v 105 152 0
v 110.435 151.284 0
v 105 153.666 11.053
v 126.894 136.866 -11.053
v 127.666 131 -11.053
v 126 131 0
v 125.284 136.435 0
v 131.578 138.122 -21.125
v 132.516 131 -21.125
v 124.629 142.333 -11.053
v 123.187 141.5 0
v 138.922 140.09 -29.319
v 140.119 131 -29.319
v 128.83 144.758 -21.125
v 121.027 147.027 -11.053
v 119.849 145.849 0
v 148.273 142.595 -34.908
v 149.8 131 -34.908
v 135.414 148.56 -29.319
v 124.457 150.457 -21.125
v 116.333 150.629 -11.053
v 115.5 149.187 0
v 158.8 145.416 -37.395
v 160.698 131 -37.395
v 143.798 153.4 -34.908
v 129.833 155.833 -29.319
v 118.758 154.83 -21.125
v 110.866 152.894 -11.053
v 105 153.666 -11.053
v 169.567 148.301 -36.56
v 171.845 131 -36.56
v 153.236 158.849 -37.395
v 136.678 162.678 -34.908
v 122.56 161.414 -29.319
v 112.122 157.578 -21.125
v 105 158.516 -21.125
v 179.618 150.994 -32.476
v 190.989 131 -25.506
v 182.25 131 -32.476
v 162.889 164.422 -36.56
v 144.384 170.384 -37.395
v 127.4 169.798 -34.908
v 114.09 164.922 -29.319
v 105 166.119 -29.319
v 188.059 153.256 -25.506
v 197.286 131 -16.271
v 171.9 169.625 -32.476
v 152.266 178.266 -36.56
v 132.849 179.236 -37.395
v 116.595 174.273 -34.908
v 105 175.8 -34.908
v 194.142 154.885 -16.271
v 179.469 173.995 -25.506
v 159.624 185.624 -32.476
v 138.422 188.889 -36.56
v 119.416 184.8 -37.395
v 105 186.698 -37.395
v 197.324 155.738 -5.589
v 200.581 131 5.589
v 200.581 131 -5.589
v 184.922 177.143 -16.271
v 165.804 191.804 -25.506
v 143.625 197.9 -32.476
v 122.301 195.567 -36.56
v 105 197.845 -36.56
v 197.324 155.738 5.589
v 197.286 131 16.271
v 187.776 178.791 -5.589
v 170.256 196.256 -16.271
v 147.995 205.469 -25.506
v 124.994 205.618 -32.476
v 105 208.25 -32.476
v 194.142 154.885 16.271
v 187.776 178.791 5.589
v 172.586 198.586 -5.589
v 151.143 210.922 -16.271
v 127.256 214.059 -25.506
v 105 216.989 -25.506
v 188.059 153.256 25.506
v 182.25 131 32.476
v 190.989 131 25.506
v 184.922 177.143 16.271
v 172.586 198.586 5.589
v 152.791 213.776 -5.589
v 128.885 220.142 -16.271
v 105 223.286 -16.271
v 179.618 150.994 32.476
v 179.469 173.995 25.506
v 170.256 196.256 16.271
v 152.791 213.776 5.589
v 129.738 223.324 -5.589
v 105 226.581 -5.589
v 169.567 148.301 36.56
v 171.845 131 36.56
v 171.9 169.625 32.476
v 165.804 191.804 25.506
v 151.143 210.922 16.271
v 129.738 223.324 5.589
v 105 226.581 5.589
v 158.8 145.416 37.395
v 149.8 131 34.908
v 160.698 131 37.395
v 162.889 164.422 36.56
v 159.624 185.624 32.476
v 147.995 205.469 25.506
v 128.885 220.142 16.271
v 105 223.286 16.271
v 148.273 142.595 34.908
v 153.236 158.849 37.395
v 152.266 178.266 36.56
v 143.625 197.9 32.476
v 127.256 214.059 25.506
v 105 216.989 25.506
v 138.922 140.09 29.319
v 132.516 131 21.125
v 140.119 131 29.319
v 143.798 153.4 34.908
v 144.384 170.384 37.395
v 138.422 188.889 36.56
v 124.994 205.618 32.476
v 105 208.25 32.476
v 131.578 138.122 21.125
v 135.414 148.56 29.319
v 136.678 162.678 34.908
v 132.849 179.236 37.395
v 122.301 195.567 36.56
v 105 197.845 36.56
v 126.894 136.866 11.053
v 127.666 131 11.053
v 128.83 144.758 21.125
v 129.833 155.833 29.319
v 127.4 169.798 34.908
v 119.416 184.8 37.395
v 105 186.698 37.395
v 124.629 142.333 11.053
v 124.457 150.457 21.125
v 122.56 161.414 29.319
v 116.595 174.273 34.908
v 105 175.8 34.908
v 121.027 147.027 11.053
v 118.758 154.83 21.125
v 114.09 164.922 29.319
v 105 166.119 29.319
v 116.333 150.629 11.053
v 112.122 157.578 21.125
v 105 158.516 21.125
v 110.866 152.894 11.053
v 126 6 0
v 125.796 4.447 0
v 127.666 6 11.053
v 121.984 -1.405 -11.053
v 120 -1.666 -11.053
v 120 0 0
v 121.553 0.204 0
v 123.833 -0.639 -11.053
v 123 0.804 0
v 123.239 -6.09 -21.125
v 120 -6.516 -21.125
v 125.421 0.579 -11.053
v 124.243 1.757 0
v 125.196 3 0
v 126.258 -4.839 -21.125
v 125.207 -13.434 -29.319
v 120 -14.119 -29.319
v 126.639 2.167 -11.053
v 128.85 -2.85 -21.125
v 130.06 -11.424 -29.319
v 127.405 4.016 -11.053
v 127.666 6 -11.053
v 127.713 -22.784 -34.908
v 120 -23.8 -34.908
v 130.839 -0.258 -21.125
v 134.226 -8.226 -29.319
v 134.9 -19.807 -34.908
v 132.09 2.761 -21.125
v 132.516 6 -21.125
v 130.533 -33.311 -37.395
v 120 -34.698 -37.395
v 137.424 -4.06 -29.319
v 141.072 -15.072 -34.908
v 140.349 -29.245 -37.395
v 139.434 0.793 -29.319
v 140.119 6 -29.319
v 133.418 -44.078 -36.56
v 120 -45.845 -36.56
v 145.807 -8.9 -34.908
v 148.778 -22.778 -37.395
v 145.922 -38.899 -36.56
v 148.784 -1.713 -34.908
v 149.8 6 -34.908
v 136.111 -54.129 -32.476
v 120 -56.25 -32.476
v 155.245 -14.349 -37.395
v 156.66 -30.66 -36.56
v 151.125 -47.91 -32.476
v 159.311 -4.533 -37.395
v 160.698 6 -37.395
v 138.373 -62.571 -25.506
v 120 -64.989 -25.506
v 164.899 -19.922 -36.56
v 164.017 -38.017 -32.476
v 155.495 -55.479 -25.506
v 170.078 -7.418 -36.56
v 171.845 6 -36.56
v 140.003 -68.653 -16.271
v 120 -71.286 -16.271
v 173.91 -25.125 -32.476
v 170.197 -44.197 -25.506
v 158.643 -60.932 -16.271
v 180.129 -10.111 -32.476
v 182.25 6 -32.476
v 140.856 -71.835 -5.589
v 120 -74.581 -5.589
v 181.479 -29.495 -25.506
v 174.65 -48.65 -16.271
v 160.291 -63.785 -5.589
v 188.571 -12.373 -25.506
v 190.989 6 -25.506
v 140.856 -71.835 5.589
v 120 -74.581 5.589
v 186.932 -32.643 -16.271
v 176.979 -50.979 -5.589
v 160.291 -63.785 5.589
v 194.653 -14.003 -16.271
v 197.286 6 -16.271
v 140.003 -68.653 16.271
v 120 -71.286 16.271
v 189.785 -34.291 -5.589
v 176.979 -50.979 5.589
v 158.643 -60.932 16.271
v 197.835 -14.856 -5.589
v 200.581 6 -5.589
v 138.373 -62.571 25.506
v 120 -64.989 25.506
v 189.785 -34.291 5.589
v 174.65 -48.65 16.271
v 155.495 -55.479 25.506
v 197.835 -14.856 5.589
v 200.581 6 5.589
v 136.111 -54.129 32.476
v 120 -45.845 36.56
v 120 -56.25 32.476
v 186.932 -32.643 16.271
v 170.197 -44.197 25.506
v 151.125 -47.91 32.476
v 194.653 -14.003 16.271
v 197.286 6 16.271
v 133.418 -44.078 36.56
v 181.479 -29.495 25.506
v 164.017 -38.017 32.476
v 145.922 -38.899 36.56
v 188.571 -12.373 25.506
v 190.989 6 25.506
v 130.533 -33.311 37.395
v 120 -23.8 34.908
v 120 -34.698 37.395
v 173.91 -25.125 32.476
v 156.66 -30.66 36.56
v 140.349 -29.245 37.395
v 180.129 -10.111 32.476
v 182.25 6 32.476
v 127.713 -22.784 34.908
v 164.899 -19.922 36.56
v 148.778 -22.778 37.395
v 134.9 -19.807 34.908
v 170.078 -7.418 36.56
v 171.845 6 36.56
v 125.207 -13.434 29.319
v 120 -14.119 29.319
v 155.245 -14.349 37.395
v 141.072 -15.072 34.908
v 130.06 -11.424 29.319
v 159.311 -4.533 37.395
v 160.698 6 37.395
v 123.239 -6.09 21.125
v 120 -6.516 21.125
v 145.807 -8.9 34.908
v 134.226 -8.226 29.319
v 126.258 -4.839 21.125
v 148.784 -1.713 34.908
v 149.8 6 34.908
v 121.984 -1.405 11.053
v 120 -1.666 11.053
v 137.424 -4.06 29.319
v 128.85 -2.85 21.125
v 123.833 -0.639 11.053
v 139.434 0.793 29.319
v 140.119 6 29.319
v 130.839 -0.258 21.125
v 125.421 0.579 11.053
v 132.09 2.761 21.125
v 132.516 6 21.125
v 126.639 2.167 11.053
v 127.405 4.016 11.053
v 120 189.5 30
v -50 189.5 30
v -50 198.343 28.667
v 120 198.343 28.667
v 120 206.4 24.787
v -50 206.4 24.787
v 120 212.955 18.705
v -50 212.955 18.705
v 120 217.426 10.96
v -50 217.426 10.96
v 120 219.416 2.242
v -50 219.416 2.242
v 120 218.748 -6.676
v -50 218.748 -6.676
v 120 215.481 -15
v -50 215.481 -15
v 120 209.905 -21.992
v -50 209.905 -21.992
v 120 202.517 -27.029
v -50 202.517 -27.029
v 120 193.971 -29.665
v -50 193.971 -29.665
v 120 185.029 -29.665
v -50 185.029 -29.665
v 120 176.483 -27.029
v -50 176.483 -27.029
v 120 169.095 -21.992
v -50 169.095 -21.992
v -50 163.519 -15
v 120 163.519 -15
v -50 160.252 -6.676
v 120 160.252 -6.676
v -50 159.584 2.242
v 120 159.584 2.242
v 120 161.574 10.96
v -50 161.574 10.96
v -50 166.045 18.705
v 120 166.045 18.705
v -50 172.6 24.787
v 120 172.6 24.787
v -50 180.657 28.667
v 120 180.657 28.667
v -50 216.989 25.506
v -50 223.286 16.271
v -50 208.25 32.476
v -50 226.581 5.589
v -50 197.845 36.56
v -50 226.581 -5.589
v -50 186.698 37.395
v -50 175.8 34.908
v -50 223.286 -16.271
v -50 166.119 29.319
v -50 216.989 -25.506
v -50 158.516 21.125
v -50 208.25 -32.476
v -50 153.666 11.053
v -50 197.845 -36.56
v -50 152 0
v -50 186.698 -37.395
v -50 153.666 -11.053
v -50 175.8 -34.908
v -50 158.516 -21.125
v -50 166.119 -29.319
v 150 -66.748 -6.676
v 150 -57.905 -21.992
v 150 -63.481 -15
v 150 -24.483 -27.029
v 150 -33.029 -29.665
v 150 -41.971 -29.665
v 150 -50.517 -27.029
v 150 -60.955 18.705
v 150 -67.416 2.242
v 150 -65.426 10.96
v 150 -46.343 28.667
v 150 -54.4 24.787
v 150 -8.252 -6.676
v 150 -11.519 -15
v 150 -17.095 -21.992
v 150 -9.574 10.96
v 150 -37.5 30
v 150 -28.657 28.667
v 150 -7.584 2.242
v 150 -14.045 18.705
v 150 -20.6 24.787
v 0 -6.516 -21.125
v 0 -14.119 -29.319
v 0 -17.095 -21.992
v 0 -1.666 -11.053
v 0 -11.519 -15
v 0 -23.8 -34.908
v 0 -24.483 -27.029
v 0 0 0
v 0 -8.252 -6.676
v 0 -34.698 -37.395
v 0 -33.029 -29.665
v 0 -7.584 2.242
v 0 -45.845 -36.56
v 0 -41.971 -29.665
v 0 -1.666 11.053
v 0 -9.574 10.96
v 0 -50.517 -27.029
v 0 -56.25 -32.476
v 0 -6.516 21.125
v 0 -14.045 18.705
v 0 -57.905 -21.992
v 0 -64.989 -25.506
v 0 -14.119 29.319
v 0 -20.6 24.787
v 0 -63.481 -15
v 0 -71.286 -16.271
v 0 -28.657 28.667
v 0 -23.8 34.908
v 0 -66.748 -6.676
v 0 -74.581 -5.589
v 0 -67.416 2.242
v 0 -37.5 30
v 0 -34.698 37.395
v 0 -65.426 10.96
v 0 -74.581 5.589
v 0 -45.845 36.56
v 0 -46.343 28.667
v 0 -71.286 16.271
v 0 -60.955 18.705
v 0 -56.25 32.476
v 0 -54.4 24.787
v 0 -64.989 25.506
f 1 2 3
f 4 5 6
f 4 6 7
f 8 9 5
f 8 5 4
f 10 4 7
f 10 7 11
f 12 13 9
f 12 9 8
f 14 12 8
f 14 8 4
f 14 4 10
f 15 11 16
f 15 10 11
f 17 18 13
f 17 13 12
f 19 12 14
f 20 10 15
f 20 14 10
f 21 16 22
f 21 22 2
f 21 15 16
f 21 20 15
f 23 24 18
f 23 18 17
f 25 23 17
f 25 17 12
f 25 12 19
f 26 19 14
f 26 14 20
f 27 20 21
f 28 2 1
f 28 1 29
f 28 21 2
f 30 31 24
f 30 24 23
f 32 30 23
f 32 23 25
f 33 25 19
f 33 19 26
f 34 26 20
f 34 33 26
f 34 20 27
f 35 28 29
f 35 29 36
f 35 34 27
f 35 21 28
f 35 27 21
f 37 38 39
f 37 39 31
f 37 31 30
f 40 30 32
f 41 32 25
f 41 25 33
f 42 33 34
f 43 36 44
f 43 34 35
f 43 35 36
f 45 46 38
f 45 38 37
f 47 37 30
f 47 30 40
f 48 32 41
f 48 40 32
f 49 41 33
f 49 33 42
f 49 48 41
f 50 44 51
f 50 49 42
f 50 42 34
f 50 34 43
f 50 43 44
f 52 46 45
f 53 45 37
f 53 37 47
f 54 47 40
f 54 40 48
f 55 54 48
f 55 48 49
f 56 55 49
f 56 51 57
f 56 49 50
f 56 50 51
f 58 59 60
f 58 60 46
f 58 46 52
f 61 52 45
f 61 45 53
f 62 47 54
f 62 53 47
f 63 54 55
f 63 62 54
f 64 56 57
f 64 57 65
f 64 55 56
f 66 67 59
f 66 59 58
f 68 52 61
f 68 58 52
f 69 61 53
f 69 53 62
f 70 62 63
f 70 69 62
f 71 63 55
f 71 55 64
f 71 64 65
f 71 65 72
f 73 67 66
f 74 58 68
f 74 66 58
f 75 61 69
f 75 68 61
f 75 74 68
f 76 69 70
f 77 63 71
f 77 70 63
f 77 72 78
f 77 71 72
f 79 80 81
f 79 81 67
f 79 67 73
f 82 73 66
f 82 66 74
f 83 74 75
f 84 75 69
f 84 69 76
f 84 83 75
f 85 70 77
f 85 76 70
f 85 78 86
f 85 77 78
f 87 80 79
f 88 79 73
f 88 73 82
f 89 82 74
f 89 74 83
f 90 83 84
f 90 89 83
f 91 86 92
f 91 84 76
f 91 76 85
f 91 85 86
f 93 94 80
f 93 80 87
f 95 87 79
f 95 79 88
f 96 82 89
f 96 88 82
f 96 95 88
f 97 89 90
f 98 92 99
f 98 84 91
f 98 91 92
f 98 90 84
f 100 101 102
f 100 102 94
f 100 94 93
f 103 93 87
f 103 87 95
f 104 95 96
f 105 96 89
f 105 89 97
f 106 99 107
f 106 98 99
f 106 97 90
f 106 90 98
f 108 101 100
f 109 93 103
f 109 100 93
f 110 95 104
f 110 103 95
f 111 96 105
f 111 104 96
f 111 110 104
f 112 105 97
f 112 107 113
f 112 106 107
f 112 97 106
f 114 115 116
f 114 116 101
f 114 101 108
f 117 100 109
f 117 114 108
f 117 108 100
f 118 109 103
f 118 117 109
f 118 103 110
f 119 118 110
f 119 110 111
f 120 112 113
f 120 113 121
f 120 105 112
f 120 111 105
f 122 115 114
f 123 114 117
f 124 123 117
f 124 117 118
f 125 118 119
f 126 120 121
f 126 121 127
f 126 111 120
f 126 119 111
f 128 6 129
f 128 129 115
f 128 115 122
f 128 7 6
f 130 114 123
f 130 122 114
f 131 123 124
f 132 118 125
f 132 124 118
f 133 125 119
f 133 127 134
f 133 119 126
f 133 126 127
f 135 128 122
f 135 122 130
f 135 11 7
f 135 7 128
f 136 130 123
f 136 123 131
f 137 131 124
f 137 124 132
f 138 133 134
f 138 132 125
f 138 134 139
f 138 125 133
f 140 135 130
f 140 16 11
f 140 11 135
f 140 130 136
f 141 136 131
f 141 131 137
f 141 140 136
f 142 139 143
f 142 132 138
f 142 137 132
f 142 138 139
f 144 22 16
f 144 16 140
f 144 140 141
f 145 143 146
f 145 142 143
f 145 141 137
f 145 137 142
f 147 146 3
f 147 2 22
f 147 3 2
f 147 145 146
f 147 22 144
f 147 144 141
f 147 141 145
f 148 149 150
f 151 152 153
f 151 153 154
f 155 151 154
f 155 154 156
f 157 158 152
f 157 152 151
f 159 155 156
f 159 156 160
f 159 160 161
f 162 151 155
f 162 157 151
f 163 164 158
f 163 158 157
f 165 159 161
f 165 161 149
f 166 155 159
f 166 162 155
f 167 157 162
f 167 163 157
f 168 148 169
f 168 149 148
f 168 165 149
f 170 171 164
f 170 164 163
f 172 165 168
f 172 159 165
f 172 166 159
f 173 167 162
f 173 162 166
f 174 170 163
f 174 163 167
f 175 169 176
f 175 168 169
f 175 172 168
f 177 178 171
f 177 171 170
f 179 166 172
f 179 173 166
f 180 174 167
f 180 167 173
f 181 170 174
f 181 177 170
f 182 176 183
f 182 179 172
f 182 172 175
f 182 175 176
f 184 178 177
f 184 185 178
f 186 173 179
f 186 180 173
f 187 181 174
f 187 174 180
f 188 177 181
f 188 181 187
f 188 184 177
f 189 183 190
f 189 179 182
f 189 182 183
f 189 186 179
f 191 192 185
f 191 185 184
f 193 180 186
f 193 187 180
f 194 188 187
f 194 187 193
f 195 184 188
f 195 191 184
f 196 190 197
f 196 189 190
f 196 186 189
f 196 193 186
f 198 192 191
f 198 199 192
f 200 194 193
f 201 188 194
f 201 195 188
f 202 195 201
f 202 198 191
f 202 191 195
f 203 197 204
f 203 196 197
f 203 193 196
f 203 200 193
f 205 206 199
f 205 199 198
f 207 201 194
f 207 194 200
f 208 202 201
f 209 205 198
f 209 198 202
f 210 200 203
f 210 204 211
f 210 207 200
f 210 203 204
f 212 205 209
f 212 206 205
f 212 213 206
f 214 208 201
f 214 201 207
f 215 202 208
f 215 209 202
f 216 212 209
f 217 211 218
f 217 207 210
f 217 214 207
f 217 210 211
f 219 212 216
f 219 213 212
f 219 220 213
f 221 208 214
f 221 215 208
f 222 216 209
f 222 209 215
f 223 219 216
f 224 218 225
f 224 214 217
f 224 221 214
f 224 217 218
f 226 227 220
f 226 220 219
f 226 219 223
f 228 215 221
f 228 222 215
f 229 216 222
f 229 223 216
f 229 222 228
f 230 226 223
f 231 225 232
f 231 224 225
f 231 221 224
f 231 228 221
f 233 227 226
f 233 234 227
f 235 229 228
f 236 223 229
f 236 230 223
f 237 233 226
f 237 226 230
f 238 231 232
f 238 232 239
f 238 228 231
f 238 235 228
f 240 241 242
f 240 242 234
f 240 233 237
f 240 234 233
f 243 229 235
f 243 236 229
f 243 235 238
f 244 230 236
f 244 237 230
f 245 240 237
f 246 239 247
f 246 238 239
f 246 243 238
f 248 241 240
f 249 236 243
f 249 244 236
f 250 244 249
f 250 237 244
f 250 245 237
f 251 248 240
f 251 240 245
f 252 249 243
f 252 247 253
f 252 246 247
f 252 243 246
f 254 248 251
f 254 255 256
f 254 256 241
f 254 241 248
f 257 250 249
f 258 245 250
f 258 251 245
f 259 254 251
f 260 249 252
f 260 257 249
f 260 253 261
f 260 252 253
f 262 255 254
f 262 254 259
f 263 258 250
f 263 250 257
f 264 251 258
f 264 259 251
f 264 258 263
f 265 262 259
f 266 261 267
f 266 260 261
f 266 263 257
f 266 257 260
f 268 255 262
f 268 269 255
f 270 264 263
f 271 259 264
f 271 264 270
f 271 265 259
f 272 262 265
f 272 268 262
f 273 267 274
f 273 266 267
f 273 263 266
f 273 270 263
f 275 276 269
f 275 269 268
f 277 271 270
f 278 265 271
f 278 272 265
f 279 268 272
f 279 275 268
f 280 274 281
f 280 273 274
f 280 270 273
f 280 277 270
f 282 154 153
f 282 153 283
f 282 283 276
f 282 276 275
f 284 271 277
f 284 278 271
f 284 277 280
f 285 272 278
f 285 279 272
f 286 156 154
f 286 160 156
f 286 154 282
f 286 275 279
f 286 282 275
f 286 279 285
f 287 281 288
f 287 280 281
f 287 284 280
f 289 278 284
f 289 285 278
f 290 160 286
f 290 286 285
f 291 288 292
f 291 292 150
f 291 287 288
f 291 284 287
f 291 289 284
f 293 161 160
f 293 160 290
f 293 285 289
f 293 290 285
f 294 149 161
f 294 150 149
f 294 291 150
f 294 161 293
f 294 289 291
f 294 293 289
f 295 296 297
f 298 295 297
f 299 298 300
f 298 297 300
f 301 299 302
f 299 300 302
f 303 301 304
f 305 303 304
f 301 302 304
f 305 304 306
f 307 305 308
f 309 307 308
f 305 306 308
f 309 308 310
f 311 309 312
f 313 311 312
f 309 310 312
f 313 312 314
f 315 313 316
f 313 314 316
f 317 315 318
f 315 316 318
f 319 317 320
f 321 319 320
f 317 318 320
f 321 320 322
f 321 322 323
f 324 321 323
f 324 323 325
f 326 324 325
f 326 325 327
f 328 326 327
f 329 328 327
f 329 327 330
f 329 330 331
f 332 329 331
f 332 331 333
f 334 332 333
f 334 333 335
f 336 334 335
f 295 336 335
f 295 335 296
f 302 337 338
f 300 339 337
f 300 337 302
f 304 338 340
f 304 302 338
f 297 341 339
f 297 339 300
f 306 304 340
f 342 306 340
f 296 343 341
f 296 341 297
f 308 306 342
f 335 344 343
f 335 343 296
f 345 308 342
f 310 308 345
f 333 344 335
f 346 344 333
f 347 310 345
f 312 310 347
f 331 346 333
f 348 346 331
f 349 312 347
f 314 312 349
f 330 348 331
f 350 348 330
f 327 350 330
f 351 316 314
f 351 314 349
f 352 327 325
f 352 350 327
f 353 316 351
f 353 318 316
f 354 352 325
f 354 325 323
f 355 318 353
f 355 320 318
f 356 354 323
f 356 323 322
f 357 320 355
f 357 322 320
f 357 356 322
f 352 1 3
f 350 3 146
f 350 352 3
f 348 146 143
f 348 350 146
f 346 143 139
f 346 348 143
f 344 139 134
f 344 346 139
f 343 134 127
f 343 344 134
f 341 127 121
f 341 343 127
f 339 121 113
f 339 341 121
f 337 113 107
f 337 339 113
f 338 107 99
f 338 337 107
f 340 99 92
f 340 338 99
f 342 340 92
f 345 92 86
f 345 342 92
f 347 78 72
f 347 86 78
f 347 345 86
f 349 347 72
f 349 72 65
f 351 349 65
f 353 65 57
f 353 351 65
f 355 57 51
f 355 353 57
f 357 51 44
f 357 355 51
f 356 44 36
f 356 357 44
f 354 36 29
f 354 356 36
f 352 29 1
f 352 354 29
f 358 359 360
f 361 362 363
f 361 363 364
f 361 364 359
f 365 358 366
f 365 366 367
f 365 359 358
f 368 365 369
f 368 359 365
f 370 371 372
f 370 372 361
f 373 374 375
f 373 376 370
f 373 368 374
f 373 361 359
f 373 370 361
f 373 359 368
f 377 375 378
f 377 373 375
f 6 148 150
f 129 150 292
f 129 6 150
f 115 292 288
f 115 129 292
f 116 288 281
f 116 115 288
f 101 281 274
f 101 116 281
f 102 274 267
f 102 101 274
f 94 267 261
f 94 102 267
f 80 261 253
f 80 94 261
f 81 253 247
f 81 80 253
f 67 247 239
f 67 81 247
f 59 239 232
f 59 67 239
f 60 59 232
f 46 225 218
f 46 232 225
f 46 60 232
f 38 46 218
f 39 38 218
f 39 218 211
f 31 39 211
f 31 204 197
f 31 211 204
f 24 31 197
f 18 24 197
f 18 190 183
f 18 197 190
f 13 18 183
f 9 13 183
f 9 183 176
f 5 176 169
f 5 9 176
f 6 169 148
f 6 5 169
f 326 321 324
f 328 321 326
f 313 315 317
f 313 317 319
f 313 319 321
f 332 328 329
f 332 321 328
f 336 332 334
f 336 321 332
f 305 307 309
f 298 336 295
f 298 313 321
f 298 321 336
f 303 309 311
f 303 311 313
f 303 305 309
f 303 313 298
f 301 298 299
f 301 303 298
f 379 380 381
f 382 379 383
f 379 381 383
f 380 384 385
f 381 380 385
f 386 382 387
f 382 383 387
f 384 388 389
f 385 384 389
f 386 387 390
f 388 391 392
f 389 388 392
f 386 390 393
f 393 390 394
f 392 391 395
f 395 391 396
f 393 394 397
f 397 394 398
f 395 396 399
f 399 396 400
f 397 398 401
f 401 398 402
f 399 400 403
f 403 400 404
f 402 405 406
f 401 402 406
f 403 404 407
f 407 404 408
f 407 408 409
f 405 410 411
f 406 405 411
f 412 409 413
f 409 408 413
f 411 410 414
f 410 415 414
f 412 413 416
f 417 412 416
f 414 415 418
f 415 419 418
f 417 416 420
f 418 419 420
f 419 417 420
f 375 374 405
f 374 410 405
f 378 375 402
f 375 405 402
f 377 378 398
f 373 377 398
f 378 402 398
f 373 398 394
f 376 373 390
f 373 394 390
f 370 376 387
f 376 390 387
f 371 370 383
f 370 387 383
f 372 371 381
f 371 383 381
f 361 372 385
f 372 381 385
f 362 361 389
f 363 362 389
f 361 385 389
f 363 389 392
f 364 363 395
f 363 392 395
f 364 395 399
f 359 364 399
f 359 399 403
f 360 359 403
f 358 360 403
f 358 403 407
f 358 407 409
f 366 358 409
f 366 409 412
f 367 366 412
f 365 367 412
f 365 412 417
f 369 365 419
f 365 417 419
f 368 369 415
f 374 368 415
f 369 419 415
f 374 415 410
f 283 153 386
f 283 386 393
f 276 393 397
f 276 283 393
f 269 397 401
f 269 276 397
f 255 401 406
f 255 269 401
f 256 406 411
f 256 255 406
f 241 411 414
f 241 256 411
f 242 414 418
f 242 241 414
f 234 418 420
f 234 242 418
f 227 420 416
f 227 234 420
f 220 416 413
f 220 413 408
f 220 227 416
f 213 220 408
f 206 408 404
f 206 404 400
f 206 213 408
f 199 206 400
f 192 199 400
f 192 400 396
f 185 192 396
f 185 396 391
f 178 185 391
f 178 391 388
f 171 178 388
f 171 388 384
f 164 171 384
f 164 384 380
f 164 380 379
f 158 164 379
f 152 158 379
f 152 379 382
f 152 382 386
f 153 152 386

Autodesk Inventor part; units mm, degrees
ref_plane "YZ Plane" through (0, 0, 0) normal (1, 0, 0) x (0, 1, 0)
ref_plane "XZ Plane" through (0, 0, 0) normal (0, 1, 0) x (-1, 0, 0)
ref_plane "XY Plane" through (0, 0, 0) normal (0, 0, 1) x (1, 0, 0)
sketch "Sketch1" plane through (0, 0, 0) normal (1, 0, 0) x (0, 1, 0)
  circle A0 centre (-37.5, 0) radius 37.5
  point P0 (0, 0)
  dimension "d7" = 75
sketch3d "3D Sketch2"
  line L0 (0, -24, 0) -> (120, -24, 0)
  arc A0 (120, -24, 0) -> (150, 6, 0) centre (120, 6, 0) ccw
  line L1 (150, 6, 0) -> (150, 131, 0)
  arc A1 (150, 131, 0) -> (105, 176, 0) centre (105, 131, 0) ccw
  line L2 (105, 176, 0) -> (-50, 176, 0)
  dimension "d0" = 150
  dimension "d1" = 200
  dimension "d2" = 30
  dimension "d3" = 200
  dimension "d4" = 45
sweep "Sweep1" add profiles "Sketch1" path "3D Sketch2"
sketch "Sketch2" plane through (-50, 189.5, 0) normal (-1, 0, 0) x (0, 0, 1)
  circle A0 centre (0, 0) radius 30
  point P0 (0, -189.5)
  dimension "d10" = 60
extrude "Extrusion1" cut sketch "Sketch2" against normal blind 170
sketch "Sketch3" plane through (0, -37.5, 0) normal (-1, 0, 0) x (0, 0, 1)
  circle A0 centre (0, 0) radius 30
  point P0 (0, 37.5)
  dimension "d13" = 60
extrude "Extrusion2" cut sketch "Sketch3" against normal blind 150
properties part number "vacuum"
